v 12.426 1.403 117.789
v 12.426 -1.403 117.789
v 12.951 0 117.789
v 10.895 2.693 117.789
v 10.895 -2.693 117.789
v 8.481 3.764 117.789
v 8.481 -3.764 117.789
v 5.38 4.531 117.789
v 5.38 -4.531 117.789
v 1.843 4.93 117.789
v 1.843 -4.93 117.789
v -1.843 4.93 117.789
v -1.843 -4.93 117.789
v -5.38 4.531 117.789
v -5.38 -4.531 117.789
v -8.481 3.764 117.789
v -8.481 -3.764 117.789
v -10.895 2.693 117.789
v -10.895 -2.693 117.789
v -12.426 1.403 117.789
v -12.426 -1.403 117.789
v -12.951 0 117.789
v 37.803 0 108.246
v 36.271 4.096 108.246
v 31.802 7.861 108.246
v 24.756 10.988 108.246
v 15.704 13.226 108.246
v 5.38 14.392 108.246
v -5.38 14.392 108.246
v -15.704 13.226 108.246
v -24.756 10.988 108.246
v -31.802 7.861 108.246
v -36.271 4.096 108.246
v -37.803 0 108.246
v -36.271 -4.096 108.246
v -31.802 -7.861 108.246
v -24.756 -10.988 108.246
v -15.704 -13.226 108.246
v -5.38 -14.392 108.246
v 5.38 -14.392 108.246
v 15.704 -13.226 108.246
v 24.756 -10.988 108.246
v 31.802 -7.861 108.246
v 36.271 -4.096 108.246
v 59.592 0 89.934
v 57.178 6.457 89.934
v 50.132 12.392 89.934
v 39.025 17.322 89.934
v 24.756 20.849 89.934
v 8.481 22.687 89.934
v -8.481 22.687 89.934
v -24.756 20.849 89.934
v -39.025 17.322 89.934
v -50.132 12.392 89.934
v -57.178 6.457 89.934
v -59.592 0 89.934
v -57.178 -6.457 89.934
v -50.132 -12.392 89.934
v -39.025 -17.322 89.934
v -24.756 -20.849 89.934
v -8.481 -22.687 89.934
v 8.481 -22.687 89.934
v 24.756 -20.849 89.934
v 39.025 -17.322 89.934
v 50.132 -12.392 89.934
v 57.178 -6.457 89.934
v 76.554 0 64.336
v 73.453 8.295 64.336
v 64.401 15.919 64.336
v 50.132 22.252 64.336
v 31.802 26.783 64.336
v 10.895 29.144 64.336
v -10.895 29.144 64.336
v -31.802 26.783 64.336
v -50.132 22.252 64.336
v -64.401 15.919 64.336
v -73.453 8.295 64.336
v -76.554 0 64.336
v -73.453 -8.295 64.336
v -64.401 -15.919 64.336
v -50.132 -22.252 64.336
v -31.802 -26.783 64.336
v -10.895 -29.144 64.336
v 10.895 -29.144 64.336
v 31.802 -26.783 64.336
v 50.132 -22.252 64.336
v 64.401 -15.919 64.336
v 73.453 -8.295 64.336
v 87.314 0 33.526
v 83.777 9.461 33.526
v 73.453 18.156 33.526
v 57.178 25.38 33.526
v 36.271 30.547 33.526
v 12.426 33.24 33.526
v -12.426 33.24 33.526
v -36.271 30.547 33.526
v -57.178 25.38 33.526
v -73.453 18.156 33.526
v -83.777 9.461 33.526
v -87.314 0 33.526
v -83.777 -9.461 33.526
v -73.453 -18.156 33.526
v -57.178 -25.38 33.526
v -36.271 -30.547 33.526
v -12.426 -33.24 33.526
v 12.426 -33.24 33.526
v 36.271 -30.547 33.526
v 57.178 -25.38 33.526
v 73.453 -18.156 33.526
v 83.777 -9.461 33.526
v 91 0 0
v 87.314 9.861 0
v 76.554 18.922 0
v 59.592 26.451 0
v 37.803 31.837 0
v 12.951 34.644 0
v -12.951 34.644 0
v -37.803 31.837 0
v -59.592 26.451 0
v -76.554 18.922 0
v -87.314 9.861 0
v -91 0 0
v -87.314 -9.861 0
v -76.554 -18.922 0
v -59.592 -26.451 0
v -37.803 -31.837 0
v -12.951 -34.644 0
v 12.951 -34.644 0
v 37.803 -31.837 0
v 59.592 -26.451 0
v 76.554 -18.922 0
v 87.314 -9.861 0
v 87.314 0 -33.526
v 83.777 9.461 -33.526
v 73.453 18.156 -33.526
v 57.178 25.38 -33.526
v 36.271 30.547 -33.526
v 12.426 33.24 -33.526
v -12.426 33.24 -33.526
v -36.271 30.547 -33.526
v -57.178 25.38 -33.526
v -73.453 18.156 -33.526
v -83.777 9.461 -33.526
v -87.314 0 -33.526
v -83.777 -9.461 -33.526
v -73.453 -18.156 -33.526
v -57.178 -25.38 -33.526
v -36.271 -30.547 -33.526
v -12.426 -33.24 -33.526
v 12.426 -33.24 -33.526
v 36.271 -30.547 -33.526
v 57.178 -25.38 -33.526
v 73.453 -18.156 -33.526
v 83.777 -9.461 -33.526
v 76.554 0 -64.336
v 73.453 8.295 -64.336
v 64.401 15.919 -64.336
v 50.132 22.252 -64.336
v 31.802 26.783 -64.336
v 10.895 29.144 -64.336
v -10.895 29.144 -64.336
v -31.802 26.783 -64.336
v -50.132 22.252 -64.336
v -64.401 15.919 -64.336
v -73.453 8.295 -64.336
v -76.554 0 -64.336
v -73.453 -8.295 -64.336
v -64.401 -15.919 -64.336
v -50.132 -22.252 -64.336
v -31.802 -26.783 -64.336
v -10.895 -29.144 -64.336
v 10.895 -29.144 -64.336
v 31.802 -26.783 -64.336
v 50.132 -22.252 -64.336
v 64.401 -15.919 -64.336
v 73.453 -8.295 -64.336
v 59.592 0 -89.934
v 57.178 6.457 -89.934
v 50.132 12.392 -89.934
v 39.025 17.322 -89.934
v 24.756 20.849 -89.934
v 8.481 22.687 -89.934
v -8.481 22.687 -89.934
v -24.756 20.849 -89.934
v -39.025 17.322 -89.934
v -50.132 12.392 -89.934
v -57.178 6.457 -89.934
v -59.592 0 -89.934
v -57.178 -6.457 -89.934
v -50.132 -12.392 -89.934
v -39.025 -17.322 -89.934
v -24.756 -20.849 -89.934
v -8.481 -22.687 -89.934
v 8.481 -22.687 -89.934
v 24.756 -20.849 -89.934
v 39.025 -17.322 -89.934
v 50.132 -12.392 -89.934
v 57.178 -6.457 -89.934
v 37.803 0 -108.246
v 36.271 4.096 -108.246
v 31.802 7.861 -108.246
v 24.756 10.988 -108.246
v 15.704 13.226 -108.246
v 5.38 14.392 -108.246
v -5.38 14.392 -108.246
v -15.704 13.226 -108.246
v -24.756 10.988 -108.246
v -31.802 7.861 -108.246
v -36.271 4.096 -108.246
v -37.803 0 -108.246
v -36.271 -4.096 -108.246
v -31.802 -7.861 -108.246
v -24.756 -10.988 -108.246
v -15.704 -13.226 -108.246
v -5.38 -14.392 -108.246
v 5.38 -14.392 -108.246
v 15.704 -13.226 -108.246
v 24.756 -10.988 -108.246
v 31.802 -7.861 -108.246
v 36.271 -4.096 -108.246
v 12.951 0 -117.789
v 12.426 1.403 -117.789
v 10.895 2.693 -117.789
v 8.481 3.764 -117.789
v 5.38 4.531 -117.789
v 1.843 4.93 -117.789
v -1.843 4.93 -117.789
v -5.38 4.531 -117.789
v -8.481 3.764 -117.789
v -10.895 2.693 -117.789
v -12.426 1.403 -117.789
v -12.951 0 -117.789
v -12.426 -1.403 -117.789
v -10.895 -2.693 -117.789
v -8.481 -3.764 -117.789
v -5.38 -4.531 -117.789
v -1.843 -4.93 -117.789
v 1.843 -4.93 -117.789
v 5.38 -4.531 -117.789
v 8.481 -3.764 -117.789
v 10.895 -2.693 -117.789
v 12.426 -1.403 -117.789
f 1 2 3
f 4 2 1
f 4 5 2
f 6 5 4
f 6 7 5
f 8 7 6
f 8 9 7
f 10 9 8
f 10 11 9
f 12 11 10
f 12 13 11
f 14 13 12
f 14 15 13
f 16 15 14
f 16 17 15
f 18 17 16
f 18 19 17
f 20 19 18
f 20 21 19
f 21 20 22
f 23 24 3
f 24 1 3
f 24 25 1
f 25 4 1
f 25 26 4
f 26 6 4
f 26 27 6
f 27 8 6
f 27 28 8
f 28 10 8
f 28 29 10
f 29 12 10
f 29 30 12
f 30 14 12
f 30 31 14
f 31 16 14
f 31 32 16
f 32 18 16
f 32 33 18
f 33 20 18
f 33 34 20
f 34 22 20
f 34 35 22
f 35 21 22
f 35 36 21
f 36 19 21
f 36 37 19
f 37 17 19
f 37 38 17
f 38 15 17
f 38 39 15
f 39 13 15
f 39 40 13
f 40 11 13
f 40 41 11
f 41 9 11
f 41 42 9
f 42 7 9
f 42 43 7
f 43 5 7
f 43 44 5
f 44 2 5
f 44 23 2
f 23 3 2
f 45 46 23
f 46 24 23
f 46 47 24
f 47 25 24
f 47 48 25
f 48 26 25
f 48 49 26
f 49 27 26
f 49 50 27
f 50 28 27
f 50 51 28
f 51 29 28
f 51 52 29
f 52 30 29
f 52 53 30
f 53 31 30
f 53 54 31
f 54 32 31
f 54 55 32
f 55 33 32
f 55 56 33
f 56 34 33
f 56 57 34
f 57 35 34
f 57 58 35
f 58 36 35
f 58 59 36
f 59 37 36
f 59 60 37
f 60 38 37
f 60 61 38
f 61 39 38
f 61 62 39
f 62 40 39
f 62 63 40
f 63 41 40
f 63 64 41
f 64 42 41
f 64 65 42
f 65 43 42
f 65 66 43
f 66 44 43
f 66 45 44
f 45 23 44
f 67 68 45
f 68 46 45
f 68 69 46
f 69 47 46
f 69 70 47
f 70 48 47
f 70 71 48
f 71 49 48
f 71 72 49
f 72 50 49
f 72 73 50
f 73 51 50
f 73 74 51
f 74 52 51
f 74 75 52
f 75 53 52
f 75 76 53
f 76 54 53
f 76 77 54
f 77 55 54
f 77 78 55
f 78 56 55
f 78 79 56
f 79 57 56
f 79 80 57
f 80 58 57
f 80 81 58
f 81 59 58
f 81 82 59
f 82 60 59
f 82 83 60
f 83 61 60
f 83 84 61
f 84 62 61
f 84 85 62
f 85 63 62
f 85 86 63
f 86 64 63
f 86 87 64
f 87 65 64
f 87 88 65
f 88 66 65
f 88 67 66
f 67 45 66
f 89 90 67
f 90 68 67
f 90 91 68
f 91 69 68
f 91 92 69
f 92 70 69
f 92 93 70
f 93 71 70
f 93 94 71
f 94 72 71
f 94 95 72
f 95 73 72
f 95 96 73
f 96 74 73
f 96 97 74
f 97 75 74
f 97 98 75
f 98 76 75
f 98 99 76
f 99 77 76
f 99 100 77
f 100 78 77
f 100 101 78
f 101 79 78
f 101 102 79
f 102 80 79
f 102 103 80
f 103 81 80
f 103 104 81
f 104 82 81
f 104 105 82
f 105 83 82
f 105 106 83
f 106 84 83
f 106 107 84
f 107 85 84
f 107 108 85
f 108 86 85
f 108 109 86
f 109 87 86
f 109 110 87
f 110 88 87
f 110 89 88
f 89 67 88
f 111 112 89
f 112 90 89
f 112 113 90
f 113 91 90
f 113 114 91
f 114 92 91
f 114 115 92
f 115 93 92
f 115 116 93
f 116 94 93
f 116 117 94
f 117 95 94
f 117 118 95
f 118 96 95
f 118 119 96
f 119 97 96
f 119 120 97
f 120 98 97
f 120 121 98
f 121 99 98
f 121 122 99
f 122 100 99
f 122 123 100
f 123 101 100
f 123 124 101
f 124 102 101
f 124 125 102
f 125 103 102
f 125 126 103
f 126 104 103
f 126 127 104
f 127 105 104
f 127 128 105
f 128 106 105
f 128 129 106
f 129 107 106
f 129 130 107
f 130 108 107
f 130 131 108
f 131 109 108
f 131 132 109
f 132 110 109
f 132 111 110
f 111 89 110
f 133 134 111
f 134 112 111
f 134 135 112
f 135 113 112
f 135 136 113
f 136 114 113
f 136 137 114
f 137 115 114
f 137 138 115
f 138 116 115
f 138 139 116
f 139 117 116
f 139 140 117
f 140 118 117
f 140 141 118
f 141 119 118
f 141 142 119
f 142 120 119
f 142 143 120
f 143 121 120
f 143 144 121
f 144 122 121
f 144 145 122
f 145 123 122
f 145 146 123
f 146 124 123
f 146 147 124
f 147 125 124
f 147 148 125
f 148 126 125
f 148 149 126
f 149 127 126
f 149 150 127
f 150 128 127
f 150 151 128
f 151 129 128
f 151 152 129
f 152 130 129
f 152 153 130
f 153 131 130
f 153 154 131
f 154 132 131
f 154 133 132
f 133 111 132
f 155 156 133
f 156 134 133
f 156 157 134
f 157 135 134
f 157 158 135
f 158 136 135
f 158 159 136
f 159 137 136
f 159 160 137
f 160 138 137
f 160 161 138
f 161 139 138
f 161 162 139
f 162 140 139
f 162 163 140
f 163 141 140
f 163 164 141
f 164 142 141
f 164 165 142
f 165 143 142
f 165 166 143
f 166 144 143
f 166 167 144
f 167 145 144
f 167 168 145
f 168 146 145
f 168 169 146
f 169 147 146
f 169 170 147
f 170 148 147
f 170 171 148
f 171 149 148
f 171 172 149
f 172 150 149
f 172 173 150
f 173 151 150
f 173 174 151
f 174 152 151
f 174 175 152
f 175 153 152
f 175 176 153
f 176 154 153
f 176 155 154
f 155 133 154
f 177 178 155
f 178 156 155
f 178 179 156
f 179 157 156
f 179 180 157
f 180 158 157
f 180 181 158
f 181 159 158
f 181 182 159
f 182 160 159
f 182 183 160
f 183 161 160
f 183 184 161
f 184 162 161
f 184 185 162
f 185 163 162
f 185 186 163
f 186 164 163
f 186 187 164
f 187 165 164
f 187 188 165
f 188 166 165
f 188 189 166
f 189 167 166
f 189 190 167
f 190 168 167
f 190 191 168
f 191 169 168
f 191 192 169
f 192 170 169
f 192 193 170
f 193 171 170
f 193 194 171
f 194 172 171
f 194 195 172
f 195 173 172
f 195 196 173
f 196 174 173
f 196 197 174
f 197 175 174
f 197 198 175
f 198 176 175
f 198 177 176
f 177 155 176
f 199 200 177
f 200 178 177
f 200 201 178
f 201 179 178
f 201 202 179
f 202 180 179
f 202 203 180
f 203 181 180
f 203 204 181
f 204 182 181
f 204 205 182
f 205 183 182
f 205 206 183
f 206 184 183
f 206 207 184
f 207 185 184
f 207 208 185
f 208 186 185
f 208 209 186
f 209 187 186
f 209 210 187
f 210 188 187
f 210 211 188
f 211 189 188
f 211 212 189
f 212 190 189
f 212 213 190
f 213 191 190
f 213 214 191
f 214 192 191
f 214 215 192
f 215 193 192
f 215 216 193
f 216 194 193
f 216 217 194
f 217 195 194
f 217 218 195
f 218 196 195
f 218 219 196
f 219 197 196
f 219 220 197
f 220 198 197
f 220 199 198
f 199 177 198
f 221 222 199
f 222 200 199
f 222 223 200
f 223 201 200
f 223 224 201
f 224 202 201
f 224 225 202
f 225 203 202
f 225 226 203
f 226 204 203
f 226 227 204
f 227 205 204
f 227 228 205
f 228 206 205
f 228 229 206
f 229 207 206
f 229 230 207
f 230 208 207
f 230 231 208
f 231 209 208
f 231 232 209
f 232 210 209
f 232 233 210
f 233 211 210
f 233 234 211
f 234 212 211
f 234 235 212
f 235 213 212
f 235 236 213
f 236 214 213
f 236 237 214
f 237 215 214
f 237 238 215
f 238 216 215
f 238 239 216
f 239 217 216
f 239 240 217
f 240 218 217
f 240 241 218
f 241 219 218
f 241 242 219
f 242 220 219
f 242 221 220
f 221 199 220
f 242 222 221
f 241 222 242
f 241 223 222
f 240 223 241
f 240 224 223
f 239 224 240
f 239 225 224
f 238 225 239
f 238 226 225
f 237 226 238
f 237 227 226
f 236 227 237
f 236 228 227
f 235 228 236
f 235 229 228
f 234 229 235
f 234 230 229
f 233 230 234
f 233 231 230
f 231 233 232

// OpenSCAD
// Generated by SolidPython 1.0.1 on 2020-07-29 00:46:50


scale(v = [13, 5, 17]) {
	sphere(r = 7);
}
/***********************************************
*********      SolidPython code:      **********
************************************************
 
# import packages: SolidPython
from solid import *
from solid.utils import *
from itertools import chain, combinations, permutations


class Resize:

    def __init__(self, scad_file):
        self.scad_file = scad_file
        #self.scad_file = import_scad(scad_file)
        # cone/cylinder param:
        self.r1 = 0
        self.r2 = 0
        self.h = 0
        # rectangular prism param:
        self.w = 0
        self.l = 0
        # ellipse param:
        self.r = 0

    # import OpenScad code (file name corresponds to shape)


    # classify shape + parameters
    def assign(self, param1, param2, param3):
        if self.scad_file == 'cone.scad':
            self.r1 = param1
            self.r2 = param2
            self.h = param3
        elif self.scad_file == 'cylinder.scad':
            self.r1 = param1
            self.r2 = param2
            self.h = param3
        elif self.scad_file == 'rectangularPrism.scad':
            self.h = param1
            self.l = param2
            self.w = param3
        else:
            self.r = param1
            self.h = param2

    # resize parameters
    def iterate(self):
        x = range(3, 20, 2)
        i = 1
        if self.scad_file == 'cone.scad':
            tempList = list(permutations(x, 2))
            for temp in tempList:
                param1 = temp[0]
                param2 = temp[1]
                filepath = 'produced_scad_files/' + 'cone' + str(param1) + '_' + str(param2) + '_' + '.scad'
                scad_render_to_file(cylinder(h=param1, r1=param2, r2=0), filepath)

        elif self.scad_file == 'cylinder.scad':
            tempList = list(permutations(x, 3))
            for temp in tempList:
                param1 = temp[0]
                param2 = temp[1]
                filepath = 'produced_scad_files/' + 'cylinder' + str(param1) + '_' + str(param2) + '_' + '.scad'
                scad_render_to_file(cylinder(h=param1, r1=param2, r2=param2), filepath)

        elif self.scad_file == 'rectangularPrism.scad':
            tempList = list(permutations(x, 3))
            for temp in tempList:
                param1 = temp[0]
                param2 = temp[1]
                param3 = temp[2]
                filepath = 'produced_scad_files/' + 'rectangularPrism' + str(param1) + '_' + str(param2) + '_' + str(
                    param3) + '.scad'
                scad_render_to_file(cube(size=(param1, param2, param3)), filepath)

        elif self.scad_file == 'ellipse.scad':
            tempList = list(permutations(x, 4))
            for temp in tempList:
                param1 = temp[0]
                param2 = temp[1]
                param3 = temp[2]
                param4 = temp[3]
                filepath = 'produced_scad_files/' + 'ellipse' + str(param1) + '_' + str(param2) + '_' + str(param3) + '_' + str(param4) + '.scad'
                scad_render_to_file(scale([param1, param2, param3])(sphere(r=param4)), filepath)

    def render_to_scadfile(self):
        scad_render_to_file(scad, 'example.scad') 
 
************************************************/
